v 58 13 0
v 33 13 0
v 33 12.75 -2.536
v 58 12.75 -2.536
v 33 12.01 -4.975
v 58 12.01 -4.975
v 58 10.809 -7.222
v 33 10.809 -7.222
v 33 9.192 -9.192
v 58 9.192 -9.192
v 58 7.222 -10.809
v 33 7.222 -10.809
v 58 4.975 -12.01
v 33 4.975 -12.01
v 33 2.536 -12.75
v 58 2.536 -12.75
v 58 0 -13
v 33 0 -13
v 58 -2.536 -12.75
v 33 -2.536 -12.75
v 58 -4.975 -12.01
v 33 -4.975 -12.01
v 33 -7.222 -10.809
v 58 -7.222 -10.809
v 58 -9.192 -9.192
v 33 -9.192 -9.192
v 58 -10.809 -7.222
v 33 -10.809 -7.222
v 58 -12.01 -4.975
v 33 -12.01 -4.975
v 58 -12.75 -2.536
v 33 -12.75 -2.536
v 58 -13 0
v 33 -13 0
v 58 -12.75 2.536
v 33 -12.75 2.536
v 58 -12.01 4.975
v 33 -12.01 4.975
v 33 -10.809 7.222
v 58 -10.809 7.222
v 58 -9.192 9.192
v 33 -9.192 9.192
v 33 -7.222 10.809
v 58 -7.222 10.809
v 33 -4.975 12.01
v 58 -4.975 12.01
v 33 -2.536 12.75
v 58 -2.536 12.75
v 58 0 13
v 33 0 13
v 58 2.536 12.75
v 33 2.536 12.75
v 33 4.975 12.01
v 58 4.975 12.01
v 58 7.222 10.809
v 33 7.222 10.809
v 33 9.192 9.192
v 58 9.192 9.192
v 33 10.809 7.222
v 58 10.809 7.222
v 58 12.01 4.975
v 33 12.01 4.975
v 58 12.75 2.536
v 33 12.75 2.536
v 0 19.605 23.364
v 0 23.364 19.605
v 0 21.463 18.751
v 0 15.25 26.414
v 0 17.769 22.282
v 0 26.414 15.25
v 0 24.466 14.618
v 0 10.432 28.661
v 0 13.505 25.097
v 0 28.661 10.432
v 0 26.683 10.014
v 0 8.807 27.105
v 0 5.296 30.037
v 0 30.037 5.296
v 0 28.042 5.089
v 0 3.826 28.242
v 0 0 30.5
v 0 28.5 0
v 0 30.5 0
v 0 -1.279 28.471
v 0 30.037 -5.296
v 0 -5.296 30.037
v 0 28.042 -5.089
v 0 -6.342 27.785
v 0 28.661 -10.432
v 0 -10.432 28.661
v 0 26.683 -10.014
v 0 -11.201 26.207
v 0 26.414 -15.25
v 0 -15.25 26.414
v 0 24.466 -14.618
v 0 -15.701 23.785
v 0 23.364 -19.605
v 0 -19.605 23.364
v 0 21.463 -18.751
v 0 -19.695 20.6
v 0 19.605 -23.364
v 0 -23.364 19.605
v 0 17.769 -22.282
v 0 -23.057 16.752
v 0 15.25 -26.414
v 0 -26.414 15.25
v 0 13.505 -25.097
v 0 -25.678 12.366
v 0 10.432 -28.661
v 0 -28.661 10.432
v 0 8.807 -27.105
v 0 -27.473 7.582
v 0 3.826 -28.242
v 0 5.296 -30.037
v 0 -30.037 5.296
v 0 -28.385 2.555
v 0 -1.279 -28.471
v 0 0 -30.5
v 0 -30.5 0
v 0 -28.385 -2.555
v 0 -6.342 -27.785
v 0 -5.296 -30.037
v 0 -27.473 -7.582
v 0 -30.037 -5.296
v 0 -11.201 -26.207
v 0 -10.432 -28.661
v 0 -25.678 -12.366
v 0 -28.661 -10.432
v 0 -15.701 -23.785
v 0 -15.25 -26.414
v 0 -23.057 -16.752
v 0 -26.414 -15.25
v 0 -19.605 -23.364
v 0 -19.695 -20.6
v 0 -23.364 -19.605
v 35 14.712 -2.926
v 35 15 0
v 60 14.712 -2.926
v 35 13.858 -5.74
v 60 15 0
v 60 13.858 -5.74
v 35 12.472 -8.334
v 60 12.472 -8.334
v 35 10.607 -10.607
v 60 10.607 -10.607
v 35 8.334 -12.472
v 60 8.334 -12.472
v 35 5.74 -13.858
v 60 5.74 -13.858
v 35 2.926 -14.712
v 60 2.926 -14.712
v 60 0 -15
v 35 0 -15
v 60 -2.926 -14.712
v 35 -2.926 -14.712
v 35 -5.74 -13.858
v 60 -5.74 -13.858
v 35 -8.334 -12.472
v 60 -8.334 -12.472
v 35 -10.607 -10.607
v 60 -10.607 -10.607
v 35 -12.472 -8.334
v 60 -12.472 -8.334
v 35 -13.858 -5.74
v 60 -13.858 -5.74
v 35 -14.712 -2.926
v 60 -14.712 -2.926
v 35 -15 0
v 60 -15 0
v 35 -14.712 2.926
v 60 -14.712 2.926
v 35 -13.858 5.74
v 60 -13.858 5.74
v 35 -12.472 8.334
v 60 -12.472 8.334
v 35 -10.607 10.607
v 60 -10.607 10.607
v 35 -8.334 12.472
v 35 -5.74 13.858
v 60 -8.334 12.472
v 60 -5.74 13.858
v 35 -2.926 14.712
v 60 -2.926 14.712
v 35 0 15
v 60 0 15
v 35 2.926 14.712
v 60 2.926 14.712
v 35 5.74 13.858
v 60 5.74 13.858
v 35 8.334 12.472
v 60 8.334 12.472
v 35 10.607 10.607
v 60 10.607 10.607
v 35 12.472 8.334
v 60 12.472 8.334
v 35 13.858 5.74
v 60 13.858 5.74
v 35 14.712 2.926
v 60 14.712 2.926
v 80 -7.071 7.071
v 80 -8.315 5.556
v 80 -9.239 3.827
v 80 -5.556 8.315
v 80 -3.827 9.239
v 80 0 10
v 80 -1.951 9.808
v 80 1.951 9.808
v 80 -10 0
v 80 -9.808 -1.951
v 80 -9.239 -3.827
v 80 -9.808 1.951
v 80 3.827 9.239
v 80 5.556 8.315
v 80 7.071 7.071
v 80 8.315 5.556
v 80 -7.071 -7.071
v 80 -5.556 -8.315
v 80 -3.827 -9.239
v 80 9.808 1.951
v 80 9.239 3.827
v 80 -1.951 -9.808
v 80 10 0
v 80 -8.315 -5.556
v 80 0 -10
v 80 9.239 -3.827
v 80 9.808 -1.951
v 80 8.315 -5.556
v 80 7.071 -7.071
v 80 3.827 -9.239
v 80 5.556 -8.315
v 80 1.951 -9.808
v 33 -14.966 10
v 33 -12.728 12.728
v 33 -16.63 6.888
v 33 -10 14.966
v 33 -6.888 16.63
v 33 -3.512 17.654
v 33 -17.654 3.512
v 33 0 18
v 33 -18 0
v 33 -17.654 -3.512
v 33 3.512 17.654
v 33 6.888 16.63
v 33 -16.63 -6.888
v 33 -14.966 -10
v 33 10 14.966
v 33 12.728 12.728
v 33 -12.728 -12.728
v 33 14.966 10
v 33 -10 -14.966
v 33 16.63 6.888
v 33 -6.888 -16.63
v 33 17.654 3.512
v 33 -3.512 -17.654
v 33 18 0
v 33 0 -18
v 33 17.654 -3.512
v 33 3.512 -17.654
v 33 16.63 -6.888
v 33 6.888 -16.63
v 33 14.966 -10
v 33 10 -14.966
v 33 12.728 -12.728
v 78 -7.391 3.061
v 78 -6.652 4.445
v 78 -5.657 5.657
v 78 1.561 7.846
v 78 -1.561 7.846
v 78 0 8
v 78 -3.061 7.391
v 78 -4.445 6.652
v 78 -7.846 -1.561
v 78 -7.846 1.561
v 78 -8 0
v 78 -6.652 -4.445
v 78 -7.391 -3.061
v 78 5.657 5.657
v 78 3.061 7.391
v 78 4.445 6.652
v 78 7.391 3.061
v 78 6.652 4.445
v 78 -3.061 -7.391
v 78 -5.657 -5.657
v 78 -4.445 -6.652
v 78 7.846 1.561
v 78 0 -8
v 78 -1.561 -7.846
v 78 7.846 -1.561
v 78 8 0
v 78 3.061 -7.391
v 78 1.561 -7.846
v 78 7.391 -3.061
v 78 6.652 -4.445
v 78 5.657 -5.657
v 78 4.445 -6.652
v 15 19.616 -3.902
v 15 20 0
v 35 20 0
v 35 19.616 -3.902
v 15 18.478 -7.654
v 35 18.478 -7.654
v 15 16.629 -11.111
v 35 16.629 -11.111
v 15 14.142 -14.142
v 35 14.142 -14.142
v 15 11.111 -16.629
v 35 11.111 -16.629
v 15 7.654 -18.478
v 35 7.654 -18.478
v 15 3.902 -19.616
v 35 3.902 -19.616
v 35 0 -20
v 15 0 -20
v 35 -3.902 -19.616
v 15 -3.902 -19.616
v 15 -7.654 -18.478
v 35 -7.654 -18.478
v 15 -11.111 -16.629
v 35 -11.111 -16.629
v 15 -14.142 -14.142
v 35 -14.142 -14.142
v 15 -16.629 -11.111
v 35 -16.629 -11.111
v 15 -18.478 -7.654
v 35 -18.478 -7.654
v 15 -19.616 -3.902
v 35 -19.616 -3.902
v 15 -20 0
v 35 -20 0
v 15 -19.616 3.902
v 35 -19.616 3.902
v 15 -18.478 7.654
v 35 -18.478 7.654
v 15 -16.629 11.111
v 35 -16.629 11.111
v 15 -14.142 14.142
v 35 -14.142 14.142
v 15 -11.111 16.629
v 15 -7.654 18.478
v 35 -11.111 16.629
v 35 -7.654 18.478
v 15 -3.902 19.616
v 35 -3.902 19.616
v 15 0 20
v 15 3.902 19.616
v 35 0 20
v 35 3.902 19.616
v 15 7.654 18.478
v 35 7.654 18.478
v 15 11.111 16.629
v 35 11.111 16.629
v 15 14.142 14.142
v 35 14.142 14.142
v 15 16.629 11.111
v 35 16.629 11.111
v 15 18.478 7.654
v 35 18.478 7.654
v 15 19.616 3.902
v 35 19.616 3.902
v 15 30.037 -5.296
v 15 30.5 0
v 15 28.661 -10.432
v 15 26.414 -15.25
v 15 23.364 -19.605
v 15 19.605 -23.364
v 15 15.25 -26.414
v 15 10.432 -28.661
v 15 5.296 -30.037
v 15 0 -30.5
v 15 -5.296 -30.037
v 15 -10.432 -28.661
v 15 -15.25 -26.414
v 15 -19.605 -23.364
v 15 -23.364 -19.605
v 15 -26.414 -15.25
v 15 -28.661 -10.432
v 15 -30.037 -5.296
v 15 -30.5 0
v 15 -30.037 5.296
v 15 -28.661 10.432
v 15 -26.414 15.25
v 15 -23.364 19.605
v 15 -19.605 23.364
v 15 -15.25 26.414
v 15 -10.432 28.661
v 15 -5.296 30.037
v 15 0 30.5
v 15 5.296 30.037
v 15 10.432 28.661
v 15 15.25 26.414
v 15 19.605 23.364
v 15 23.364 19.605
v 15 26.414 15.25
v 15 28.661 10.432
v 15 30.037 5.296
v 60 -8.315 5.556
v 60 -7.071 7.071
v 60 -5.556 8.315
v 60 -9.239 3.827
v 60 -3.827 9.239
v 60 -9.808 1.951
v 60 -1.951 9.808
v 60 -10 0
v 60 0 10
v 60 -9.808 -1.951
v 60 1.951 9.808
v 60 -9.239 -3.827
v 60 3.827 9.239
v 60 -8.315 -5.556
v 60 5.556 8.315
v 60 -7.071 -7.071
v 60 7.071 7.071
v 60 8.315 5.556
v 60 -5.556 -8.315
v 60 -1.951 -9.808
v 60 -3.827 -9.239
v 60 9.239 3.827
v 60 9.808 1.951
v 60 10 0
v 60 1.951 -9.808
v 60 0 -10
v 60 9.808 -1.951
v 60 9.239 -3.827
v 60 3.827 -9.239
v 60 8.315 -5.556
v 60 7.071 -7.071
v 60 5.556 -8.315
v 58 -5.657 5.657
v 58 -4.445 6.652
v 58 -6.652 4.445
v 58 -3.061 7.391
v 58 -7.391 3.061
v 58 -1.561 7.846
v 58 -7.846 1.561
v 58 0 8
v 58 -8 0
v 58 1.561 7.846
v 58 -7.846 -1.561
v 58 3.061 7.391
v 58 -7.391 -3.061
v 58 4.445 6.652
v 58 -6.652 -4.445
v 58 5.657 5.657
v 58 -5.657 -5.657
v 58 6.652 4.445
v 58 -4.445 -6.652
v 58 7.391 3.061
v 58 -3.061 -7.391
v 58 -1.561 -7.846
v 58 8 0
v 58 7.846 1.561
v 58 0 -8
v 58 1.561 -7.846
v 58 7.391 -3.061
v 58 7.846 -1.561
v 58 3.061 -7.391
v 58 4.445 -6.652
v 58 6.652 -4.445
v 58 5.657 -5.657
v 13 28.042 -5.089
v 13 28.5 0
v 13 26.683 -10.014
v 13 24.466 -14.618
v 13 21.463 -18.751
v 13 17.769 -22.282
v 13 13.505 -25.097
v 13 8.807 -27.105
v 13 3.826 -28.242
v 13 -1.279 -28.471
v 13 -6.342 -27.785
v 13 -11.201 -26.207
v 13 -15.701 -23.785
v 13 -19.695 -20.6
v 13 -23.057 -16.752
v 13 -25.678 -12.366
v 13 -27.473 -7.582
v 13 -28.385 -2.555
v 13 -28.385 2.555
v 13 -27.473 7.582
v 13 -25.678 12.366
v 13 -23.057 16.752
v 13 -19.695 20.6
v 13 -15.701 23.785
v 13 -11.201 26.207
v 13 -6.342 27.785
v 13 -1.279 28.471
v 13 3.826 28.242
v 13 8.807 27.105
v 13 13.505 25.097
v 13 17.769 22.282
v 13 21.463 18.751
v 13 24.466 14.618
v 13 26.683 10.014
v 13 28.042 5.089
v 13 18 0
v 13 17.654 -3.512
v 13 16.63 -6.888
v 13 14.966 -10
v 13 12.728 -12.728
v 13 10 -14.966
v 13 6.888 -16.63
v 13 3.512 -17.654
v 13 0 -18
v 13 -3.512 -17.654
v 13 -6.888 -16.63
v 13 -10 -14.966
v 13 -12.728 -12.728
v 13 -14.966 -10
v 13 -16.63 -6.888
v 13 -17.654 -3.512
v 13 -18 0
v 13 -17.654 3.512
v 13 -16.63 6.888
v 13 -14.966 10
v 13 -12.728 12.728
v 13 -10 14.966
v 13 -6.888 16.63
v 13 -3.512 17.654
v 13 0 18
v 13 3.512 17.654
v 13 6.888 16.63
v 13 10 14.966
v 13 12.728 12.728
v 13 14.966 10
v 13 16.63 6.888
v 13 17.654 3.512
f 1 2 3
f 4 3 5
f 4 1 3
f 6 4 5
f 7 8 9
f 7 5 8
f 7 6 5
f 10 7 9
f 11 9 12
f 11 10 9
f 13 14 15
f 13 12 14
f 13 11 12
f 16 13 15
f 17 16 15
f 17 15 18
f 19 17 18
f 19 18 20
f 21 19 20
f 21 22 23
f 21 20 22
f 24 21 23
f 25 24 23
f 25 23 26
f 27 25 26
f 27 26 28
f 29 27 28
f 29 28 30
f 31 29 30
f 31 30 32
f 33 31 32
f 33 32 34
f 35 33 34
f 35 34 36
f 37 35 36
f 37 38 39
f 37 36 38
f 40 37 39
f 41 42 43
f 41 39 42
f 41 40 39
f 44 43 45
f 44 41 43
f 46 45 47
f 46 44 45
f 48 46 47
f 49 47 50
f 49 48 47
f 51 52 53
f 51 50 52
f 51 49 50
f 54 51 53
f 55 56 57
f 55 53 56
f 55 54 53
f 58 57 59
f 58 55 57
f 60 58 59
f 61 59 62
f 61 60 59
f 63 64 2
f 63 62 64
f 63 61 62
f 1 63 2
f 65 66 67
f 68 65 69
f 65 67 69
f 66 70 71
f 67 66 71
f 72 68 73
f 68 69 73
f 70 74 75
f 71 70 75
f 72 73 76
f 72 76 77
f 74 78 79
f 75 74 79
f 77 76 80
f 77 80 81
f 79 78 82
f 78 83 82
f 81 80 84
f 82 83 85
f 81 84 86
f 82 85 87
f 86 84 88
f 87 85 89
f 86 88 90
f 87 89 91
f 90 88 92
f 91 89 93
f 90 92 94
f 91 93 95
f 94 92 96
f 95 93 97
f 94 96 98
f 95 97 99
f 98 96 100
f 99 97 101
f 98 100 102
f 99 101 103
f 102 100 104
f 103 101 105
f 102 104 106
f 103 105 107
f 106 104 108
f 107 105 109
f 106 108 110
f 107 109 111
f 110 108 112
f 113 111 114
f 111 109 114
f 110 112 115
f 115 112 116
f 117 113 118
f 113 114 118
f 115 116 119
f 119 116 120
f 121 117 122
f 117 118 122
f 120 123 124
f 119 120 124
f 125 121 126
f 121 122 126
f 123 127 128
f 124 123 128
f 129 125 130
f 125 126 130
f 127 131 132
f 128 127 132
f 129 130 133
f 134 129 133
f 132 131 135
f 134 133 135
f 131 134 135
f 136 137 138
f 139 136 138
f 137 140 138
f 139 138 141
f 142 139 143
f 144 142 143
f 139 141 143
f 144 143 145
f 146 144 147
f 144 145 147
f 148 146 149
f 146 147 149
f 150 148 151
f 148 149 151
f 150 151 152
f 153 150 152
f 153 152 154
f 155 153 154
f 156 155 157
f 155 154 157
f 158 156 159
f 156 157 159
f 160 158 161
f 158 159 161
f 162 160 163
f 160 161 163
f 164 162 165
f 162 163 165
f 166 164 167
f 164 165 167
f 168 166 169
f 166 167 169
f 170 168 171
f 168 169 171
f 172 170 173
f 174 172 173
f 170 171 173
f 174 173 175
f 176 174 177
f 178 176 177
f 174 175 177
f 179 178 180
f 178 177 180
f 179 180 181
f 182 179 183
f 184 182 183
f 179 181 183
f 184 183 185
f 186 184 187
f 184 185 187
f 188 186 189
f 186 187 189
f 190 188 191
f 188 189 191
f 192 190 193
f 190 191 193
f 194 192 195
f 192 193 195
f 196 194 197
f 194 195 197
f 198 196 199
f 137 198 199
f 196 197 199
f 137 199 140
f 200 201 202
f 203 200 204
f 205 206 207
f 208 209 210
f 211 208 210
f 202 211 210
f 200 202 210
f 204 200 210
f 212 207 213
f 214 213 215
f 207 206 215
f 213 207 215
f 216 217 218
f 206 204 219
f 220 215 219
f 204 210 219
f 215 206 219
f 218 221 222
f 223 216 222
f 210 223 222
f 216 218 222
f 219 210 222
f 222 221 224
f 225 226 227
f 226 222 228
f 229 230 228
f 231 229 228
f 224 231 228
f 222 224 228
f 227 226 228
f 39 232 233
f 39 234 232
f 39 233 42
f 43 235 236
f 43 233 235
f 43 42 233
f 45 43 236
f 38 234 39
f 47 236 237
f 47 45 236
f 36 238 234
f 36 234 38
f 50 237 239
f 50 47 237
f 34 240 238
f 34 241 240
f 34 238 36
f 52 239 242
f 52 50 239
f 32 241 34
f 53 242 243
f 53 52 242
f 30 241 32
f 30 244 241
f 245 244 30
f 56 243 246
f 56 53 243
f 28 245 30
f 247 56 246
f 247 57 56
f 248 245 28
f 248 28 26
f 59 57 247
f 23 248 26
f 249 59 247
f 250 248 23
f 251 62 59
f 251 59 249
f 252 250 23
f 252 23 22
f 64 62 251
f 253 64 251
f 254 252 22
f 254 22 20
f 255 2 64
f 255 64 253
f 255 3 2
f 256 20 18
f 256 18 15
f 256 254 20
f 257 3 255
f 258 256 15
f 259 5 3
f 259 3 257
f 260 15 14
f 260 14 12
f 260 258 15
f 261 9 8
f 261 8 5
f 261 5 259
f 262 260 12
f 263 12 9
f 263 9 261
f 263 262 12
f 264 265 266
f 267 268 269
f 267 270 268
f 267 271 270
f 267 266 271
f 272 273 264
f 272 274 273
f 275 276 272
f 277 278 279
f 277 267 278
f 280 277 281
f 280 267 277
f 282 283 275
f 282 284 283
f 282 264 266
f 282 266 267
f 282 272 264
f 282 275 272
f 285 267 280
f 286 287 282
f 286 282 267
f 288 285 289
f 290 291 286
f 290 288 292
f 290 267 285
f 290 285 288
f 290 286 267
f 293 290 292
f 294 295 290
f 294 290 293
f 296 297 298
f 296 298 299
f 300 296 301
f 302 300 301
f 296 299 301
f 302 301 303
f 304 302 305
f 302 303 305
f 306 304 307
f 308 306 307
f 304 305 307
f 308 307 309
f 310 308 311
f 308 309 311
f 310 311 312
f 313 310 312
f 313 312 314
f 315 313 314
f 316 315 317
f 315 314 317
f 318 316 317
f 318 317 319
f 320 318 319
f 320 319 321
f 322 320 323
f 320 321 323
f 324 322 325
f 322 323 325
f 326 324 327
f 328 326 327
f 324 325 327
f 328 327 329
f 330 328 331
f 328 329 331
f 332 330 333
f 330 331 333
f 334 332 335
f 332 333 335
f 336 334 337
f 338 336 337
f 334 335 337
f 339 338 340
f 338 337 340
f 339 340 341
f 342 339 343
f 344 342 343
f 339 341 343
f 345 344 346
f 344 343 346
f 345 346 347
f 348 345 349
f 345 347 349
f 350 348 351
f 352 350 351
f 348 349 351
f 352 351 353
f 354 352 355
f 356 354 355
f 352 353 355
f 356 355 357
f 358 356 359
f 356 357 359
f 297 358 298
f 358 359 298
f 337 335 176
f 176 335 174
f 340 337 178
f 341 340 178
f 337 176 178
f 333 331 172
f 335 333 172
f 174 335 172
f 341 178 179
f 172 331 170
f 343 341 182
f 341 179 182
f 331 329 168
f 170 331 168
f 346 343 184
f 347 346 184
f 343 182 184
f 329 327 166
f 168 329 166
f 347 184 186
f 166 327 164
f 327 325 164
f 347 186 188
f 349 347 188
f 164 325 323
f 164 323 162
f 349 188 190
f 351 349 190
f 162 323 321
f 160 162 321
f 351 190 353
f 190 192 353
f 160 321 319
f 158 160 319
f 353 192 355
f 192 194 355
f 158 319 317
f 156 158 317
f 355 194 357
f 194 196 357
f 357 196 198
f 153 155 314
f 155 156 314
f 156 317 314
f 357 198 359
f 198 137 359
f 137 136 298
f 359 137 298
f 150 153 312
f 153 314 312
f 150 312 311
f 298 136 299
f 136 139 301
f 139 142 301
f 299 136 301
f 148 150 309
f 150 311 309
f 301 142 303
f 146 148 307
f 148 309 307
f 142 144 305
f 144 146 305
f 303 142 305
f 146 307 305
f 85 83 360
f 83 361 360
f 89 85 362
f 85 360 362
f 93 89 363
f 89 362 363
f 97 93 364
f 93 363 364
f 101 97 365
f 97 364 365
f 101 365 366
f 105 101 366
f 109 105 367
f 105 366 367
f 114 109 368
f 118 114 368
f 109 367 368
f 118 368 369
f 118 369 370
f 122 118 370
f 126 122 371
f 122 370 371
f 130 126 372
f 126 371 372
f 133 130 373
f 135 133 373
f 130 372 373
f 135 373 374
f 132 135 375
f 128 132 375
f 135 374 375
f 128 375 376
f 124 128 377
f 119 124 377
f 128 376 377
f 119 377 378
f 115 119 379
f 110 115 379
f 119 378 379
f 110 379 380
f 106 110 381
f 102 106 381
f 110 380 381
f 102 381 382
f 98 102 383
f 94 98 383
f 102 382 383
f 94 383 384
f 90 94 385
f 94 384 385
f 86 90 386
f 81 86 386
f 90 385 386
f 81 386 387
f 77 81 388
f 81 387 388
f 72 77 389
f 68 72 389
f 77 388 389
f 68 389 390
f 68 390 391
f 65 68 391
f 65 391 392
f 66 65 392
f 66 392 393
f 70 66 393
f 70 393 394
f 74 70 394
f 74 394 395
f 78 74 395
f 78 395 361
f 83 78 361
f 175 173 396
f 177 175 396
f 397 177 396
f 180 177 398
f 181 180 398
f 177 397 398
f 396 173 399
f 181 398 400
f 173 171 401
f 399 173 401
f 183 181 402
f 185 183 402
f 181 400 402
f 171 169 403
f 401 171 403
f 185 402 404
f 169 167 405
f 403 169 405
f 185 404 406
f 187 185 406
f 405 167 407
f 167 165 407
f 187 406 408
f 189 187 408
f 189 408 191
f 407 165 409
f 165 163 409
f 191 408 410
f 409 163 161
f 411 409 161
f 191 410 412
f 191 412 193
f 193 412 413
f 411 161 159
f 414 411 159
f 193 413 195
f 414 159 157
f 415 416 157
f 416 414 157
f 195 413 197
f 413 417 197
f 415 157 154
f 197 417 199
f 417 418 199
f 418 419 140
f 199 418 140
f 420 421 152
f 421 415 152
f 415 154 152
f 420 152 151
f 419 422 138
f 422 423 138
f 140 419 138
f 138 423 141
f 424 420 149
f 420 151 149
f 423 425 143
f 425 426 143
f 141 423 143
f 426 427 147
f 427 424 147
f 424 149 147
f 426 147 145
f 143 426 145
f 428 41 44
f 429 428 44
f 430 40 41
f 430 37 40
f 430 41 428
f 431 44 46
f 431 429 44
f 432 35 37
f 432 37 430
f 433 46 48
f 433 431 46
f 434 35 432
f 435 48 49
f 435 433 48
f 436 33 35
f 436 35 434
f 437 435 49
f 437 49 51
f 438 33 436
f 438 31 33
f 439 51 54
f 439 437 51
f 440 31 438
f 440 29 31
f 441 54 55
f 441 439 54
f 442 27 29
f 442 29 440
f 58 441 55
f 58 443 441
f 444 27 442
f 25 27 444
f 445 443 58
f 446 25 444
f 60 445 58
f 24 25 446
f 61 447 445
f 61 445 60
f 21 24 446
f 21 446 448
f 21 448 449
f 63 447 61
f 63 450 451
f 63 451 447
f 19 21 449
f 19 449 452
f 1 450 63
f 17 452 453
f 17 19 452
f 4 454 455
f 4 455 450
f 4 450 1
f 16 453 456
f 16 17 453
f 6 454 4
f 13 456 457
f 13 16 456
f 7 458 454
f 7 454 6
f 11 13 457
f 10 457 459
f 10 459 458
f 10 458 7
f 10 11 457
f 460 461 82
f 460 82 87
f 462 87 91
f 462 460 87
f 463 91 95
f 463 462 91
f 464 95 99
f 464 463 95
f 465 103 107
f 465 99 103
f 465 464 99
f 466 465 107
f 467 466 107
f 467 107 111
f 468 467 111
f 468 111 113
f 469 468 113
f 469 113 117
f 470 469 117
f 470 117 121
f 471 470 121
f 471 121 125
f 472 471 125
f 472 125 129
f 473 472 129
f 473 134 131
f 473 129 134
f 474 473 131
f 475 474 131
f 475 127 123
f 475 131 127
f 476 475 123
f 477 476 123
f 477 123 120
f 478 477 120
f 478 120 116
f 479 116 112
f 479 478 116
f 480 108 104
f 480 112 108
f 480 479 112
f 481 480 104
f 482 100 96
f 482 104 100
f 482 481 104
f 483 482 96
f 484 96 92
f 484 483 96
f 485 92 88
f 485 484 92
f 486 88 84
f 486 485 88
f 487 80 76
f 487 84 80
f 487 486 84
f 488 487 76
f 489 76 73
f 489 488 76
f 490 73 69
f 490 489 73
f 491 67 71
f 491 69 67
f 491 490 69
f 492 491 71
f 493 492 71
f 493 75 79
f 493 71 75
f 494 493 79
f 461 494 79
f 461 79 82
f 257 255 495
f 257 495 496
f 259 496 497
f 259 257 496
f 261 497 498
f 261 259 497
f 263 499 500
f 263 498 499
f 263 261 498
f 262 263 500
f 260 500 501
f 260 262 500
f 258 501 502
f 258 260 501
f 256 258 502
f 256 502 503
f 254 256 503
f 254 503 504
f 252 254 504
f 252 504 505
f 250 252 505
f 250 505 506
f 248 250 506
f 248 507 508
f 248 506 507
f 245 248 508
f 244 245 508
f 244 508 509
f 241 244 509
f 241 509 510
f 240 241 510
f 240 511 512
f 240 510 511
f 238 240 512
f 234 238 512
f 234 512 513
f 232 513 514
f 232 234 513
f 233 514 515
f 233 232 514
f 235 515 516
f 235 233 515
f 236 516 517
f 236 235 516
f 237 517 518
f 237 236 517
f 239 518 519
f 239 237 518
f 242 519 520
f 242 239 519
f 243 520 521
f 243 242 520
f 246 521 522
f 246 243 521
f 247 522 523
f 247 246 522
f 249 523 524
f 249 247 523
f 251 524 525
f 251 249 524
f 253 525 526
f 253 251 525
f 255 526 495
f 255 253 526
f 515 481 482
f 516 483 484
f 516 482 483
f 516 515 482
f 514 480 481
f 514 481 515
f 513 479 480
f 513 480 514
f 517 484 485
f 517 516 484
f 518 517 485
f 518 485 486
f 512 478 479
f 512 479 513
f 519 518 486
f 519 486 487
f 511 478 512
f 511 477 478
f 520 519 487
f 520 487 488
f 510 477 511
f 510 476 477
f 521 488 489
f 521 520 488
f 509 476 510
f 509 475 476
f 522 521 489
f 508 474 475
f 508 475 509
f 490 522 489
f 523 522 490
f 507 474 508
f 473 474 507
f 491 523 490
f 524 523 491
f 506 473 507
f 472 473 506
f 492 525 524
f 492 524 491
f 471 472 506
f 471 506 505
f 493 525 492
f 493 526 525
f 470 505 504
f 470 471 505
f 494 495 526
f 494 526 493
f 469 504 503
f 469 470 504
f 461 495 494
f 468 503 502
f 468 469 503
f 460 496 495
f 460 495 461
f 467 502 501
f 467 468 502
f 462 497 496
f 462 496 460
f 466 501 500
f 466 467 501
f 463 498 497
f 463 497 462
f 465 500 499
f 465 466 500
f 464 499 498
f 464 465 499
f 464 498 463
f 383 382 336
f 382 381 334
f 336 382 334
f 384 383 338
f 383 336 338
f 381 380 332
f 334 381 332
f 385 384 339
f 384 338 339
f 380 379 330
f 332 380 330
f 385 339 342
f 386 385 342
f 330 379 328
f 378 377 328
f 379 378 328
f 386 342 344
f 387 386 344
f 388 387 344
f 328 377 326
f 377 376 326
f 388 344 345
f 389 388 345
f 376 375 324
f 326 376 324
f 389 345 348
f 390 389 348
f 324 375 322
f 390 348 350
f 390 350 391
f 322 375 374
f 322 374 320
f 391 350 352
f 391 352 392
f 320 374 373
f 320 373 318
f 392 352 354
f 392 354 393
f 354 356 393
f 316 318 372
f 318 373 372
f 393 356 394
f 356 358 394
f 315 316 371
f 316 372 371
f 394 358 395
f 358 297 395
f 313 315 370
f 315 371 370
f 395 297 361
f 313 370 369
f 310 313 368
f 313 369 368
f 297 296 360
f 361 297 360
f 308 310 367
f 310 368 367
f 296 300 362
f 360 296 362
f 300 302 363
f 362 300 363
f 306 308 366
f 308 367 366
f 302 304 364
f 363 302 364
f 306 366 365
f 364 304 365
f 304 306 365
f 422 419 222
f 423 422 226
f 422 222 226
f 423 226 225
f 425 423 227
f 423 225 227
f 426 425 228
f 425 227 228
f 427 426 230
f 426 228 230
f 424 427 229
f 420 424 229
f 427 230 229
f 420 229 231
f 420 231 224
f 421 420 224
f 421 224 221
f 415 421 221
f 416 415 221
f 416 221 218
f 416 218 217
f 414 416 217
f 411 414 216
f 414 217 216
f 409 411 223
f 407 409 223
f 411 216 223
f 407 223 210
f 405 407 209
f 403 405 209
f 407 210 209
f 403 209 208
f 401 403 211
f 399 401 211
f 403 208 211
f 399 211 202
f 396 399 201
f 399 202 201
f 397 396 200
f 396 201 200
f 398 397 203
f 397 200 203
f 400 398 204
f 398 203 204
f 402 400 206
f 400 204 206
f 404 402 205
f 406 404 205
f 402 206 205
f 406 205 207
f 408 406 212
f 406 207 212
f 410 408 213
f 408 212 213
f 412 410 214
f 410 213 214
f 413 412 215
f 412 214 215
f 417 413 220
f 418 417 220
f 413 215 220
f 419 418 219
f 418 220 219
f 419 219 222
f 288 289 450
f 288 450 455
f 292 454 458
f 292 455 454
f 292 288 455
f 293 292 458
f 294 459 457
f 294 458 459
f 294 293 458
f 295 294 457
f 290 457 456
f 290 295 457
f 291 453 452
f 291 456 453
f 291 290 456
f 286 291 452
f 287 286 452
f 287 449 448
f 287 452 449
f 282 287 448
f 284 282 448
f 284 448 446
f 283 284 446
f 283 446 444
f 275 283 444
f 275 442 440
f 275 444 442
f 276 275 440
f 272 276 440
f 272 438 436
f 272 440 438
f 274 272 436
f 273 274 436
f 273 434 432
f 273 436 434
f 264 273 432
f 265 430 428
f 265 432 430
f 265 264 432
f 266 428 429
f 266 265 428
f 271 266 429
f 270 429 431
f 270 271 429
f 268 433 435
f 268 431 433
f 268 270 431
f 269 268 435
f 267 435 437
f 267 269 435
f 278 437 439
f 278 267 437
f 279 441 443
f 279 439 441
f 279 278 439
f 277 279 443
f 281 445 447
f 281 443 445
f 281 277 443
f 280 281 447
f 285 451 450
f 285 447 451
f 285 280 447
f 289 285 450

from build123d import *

# Parameters (mm, degrees)
SVUOTA1_T = -2


with BuildPart() as part:
    # Schizzo1 → Rivoluzione1 (revolve)
    with BuildSketch(Plane.XY):
        Polygon((0, 0), (0, 30.5), (15, 30.5), (15, 20), (35, 20), (35, 15), (60, 15), (60, 10), (80, 10), (80, 0), align=None)
    revolve(axis=Axis((80, 0, 0), (-1, 0, 0)))

    # Svuota1
    svuota1_openings = [part.faces().sort_by_distance(p)[0] for p in [
        (0, 0, 0),
    ]]
    offset(amount=SVUOTA1_T, openings=svuota1_openings, kind=Kind.INTERSECTION)


solid = part.part
